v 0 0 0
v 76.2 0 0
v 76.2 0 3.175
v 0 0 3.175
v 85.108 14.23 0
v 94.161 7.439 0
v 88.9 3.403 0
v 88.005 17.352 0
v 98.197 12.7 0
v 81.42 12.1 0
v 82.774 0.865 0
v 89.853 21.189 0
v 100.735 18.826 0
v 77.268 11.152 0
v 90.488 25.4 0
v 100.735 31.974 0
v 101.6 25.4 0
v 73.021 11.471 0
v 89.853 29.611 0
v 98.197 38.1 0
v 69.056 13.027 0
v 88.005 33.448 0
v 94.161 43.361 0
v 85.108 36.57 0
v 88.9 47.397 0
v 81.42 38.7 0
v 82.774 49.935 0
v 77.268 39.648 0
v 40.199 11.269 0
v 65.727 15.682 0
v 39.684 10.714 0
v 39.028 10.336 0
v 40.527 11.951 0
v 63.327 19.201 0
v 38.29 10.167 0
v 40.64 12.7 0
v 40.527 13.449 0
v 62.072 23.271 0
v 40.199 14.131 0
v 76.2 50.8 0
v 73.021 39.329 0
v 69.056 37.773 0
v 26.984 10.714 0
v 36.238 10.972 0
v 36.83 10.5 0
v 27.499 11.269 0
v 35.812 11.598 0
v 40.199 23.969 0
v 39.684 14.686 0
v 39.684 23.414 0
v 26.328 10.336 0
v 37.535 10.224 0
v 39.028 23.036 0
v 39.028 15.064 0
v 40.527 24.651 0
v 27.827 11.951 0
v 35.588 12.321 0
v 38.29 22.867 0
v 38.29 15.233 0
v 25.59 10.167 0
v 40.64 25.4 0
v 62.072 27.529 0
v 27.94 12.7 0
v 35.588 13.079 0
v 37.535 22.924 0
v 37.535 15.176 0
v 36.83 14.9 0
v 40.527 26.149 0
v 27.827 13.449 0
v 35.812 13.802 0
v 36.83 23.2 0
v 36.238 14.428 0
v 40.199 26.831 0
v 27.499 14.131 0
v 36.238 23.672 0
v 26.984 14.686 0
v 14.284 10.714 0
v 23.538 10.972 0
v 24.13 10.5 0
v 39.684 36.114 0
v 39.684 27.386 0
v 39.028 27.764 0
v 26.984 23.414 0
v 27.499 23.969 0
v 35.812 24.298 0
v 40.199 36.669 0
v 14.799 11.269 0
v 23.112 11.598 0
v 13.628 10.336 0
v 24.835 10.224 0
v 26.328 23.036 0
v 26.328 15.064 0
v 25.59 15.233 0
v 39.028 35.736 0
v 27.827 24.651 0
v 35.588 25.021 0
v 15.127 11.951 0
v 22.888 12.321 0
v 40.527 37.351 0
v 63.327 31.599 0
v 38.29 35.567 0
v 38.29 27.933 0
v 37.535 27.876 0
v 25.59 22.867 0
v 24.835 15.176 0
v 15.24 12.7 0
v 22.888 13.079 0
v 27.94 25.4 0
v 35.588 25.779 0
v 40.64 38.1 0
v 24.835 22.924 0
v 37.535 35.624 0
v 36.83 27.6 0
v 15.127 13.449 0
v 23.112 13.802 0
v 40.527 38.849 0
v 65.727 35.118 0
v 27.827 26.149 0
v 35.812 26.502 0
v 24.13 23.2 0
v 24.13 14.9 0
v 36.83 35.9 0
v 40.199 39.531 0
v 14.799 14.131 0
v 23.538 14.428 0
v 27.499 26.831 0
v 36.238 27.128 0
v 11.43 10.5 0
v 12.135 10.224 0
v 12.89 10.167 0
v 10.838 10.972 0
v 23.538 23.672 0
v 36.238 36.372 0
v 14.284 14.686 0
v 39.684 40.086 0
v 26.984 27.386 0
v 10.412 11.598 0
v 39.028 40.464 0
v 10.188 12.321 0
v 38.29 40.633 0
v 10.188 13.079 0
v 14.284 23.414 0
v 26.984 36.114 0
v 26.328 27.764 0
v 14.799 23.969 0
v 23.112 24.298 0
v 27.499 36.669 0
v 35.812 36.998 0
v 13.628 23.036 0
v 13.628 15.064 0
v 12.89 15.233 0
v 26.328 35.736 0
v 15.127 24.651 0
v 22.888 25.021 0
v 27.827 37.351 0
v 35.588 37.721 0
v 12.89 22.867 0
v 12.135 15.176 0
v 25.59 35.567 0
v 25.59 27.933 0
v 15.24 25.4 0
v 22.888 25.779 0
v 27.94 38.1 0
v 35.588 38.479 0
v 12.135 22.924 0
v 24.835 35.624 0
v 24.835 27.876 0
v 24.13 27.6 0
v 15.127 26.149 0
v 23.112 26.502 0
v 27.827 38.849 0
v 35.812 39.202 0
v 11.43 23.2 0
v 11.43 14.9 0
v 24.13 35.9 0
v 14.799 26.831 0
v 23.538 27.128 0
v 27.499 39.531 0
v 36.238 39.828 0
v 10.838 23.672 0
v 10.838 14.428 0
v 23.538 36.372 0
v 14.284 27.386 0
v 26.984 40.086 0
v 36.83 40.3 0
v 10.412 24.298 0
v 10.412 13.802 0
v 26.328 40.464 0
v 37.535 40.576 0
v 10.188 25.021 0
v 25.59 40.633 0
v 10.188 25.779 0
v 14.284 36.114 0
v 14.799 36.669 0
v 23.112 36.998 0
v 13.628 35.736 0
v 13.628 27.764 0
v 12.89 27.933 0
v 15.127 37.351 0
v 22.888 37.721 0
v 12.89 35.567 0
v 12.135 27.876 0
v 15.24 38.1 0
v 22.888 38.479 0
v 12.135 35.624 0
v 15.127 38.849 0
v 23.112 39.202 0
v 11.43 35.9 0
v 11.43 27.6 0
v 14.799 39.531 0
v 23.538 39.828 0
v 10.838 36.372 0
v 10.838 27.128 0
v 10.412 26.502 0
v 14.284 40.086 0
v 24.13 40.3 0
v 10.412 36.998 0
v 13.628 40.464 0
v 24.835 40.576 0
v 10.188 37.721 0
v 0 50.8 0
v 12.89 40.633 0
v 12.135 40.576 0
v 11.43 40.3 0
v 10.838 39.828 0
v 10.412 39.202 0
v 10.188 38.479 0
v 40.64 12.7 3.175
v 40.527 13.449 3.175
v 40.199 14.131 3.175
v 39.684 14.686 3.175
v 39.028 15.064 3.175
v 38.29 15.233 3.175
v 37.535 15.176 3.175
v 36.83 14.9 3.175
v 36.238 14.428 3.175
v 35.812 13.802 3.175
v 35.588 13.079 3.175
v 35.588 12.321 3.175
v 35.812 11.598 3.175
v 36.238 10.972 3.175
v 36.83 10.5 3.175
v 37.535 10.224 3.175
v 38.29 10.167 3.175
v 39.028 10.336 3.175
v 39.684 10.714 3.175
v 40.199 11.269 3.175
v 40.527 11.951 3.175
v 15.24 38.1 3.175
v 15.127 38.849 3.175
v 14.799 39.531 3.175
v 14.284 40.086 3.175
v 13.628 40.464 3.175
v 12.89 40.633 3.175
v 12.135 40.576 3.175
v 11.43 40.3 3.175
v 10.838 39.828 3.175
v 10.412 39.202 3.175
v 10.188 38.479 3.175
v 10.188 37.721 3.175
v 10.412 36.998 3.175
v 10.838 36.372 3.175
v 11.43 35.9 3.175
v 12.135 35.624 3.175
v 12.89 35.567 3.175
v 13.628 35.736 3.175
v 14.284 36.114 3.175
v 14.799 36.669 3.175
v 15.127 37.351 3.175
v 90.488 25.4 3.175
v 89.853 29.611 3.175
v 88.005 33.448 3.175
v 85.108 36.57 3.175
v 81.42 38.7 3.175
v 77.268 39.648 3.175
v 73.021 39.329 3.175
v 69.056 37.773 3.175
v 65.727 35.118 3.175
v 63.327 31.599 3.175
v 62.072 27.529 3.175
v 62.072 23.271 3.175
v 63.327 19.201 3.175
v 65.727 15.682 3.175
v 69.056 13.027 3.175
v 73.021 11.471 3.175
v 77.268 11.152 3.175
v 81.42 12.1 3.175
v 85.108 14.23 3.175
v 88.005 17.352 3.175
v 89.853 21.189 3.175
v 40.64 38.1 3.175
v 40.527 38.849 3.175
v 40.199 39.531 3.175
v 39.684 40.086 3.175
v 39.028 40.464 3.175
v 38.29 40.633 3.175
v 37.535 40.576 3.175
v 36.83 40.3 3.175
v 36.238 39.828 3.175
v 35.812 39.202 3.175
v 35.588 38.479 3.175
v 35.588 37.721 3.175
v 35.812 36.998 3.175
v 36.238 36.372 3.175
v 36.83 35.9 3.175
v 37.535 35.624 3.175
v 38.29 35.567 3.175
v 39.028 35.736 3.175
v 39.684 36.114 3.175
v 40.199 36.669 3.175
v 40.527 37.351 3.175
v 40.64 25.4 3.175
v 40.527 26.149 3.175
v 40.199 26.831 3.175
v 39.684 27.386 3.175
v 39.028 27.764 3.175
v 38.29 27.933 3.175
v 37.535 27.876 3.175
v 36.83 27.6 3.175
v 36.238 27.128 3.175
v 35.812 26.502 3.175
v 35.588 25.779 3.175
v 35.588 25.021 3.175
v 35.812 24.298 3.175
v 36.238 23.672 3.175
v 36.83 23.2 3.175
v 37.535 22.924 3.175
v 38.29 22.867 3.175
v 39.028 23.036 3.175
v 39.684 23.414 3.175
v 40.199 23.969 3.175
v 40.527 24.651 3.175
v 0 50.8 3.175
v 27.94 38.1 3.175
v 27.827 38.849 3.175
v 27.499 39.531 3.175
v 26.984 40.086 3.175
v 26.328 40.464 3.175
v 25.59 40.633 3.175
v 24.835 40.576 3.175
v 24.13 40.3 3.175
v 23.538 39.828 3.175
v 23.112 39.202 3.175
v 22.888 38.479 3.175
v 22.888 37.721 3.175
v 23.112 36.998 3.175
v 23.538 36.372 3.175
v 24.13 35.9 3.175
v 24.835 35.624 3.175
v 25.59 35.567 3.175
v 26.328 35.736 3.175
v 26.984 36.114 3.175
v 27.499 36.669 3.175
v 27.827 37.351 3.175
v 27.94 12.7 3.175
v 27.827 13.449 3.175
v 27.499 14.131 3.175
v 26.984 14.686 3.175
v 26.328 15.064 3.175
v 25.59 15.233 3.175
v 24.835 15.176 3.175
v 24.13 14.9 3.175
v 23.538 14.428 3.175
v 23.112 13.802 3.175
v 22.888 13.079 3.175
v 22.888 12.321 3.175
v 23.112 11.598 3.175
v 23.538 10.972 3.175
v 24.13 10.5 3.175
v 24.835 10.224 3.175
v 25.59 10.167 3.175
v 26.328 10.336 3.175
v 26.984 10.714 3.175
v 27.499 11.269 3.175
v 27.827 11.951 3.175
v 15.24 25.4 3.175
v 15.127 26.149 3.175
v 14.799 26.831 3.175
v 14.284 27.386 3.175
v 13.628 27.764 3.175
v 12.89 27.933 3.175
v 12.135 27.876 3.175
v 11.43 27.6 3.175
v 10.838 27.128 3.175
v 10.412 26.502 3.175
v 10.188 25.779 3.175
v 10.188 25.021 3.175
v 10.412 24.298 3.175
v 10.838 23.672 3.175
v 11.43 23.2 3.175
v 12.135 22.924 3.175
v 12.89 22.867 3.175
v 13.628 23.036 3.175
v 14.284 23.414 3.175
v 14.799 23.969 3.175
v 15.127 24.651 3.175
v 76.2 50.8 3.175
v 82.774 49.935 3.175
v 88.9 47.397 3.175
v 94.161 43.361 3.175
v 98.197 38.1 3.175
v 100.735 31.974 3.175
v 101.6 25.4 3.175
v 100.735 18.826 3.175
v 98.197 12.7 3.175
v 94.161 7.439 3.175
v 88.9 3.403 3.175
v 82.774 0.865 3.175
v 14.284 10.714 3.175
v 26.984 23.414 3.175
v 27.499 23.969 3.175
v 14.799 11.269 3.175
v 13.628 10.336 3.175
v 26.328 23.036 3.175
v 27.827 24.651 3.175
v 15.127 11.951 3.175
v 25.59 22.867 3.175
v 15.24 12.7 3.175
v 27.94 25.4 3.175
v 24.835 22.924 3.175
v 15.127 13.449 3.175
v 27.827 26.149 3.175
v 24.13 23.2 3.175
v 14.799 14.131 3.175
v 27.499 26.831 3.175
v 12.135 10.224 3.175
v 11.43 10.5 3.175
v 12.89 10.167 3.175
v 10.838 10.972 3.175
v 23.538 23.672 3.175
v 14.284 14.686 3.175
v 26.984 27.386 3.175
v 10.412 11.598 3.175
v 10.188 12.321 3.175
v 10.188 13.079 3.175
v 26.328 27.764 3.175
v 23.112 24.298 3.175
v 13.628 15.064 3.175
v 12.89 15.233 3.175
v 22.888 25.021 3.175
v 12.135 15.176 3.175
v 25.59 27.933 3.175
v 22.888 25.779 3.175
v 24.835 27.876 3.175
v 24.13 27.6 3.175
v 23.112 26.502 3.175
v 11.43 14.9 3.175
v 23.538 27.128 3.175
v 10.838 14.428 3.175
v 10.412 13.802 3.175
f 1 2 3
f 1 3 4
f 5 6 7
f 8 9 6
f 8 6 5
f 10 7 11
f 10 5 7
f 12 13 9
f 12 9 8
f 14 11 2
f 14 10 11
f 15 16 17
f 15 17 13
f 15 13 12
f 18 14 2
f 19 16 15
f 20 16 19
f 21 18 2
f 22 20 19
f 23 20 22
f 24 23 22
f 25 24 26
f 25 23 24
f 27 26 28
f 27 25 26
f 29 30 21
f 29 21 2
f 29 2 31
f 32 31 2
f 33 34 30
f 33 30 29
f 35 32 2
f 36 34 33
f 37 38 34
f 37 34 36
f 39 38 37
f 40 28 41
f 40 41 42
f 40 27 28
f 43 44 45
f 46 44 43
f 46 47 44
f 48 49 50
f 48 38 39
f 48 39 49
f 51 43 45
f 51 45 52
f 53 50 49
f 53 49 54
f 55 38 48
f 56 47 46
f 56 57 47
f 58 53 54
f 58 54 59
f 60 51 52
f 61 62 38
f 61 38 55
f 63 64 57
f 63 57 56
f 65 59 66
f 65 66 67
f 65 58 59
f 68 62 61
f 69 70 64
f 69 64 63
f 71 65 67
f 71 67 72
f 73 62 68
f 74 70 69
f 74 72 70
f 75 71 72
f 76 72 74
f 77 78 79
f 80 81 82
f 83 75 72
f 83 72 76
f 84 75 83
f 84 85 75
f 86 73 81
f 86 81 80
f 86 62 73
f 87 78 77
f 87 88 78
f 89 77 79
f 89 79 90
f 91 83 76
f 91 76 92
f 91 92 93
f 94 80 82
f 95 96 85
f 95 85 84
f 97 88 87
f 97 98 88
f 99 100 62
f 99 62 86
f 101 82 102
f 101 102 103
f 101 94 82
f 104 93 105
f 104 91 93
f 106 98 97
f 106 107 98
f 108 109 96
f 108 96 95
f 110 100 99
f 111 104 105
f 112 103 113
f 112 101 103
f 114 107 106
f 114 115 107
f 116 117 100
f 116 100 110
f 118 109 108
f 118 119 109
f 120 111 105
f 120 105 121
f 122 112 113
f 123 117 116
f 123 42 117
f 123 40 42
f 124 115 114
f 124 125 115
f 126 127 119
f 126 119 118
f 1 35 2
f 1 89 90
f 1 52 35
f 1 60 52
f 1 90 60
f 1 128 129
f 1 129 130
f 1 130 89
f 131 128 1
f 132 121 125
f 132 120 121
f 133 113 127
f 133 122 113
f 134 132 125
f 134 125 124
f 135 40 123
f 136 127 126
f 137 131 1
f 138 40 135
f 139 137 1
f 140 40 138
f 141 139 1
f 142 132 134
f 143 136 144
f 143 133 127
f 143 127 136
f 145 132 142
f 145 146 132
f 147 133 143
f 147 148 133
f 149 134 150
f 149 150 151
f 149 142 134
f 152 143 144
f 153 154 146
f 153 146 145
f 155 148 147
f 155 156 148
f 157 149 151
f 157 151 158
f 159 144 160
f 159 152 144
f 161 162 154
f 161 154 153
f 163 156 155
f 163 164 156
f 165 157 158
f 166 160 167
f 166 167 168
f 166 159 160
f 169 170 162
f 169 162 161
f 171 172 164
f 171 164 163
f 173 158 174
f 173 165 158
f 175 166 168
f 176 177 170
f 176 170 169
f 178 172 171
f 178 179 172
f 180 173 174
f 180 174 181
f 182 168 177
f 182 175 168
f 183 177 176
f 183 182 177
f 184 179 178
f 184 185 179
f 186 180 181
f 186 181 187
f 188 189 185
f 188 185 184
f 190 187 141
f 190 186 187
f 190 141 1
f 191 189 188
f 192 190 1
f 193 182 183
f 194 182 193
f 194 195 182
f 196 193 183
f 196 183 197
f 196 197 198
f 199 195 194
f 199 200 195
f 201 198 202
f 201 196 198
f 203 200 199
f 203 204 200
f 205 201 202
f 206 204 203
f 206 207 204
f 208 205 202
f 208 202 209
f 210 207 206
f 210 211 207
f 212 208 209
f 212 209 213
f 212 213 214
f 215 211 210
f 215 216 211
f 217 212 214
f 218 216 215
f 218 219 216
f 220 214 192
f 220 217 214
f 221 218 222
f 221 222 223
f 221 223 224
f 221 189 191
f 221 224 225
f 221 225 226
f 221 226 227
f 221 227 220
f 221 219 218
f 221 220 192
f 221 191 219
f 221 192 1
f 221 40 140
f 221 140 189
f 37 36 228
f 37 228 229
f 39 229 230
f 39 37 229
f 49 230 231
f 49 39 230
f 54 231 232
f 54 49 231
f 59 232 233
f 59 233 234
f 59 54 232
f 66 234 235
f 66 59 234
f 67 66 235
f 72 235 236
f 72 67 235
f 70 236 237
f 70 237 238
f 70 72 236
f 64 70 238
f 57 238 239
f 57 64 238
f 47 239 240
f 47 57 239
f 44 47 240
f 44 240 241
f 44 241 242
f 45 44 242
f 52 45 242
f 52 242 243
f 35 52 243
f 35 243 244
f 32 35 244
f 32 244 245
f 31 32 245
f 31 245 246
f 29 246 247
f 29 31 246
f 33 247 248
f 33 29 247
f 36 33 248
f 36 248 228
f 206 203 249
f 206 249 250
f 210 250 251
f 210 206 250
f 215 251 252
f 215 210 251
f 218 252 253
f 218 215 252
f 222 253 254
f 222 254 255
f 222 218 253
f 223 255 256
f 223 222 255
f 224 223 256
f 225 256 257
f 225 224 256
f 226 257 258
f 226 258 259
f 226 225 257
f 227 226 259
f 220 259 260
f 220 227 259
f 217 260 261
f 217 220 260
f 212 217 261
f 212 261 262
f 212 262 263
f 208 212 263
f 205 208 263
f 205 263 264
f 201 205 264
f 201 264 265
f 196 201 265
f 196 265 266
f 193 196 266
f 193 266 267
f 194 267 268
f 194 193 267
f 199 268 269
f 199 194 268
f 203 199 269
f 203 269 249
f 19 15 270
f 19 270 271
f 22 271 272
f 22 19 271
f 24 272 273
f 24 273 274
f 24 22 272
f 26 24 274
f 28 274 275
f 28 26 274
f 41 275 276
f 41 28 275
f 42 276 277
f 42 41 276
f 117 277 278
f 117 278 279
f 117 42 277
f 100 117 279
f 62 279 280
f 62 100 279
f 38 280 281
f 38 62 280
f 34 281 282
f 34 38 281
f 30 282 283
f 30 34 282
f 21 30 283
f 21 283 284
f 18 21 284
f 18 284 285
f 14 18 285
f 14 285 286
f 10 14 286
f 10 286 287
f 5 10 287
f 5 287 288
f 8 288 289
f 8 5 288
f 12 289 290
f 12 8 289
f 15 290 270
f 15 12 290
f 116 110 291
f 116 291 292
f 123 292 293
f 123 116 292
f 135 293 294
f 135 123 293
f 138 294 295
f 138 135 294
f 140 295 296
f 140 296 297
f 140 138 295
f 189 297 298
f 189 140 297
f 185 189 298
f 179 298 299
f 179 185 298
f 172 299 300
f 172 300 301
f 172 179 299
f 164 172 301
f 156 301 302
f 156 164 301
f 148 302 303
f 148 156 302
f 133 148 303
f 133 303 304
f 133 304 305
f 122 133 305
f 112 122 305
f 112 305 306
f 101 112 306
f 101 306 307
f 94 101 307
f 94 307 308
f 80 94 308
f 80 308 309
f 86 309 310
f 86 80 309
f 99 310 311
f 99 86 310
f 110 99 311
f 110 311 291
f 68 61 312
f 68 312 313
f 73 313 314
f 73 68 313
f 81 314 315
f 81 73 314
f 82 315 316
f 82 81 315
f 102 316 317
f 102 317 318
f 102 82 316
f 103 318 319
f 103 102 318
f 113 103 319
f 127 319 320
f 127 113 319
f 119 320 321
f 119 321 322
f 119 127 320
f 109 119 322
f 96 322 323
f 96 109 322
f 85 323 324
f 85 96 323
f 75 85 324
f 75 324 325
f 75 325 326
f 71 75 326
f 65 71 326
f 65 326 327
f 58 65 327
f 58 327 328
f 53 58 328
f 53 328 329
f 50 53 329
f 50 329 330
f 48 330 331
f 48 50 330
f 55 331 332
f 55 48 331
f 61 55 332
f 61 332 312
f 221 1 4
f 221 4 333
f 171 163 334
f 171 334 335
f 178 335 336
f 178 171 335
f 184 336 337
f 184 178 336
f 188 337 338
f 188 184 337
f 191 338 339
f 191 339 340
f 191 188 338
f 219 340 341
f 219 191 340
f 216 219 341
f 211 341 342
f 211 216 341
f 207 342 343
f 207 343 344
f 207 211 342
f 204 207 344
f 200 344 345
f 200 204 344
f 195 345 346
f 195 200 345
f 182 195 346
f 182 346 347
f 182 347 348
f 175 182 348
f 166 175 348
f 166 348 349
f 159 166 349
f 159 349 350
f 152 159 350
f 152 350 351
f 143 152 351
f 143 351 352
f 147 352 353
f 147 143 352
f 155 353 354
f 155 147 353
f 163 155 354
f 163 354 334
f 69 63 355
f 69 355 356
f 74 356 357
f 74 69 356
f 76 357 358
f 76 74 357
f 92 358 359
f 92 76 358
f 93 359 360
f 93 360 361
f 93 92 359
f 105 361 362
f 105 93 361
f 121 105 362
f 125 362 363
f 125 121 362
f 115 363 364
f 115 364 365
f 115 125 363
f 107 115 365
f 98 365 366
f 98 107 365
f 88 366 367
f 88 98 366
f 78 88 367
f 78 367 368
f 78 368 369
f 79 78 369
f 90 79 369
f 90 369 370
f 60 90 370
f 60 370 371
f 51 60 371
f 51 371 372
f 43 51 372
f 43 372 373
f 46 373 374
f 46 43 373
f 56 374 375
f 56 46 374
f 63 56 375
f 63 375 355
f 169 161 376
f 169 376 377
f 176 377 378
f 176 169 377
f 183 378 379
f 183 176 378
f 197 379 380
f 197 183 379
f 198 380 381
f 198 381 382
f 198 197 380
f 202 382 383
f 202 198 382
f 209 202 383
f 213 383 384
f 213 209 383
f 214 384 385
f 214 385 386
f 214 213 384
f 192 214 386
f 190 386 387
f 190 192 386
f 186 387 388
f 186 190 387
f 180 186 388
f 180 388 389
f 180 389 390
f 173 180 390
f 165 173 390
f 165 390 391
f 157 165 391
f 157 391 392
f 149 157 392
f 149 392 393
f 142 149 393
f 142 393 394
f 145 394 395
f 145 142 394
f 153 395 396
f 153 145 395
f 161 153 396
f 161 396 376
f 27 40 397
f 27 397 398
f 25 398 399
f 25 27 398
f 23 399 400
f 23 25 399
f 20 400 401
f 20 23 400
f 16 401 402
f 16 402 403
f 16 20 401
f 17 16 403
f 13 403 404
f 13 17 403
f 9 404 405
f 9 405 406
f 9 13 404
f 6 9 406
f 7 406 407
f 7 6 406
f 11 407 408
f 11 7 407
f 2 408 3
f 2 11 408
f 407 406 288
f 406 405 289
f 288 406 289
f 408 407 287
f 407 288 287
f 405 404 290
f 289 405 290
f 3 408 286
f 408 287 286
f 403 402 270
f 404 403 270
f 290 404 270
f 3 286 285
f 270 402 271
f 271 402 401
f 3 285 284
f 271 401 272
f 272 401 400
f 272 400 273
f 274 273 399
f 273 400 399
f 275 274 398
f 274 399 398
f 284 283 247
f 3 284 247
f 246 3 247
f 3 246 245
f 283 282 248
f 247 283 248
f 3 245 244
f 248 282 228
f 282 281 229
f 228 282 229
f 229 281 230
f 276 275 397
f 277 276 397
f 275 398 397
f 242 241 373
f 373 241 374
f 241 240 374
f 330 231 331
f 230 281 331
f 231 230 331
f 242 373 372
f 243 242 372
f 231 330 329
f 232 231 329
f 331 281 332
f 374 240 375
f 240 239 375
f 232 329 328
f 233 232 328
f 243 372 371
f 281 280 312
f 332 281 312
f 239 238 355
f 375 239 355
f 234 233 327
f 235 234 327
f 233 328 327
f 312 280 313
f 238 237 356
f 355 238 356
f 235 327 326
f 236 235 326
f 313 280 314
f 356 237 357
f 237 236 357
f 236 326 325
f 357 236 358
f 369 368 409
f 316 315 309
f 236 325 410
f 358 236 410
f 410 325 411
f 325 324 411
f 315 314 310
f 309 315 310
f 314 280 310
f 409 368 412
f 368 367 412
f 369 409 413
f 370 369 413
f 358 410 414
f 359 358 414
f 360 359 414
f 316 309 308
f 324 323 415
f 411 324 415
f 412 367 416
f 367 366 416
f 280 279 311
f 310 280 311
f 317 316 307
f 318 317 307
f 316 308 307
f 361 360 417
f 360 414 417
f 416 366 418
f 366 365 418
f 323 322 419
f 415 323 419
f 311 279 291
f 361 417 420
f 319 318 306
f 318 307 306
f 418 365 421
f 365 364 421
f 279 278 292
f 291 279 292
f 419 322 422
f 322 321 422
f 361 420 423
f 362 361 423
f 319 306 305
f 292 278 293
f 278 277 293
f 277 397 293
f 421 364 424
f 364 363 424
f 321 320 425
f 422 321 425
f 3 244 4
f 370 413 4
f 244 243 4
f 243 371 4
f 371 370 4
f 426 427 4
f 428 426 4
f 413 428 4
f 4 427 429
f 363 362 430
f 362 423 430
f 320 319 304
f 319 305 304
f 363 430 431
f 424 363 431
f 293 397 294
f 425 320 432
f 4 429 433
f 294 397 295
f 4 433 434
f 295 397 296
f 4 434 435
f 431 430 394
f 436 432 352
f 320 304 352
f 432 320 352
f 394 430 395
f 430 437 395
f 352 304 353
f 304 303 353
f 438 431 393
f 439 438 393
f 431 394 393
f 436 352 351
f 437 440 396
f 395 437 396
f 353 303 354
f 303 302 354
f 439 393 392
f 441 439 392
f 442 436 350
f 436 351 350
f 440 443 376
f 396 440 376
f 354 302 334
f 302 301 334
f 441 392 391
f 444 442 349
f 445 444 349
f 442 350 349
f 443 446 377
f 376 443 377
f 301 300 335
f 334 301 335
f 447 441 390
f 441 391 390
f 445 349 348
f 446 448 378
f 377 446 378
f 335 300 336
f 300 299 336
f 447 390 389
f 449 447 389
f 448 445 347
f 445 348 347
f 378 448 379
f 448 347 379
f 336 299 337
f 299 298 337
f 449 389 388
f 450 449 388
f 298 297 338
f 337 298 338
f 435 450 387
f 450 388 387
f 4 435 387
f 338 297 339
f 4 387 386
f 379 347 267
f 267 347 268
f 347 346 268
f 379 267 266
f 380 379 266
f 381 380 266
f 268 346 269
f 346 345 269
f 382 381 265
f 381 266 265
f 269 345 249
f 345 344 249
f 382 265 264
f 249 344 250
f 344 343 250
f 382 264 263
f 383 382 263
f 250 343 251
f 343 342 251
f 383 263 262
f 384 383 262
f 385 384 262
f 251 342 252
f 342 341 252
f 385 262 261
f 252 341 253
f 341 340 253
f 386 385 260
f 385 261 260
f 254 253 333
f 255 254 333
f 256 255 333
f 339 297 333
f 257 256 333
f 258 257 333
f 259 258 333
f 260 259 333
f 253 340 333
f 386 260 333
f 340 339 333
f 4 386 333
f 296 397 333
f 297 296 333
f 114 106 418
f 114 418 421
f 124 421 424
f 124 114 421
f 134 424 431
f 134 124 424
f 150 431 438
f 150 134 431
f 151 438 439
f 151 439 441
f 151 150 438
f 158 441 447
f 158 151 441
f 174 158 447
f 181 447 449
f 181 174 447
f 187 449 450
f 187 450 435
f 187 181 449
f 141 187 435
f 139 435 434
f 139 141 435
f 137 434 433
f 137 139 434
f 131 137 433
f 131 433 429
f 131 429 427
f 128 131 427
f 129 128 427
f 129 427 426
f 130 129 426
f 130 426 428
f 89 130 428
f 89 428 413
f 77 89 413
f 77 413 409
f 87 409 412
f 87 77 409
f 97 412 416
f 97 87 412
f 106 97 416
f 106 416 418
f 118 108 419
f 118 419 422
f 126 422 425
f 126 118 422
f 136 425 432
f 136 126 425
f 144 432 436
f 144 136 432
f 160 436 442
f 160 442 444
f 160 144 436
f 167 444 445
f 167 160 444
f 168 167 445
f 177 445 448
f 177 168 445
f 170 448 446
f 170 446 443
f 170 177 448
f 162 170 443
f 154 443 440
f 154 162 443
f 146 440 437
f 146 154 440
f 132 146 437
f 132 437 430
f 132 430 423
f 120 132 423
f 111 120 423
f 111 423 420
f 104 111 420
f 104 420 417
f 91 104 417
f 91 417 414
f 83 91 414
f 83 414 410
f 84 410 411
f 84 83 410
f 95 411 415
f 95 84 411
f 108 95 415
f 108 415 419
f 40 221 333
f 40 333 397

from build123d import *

# Parameters (mm, degrees)
SKETCH1_R           = 2.54
SKETCH1_R_2         = 14.2875
BOSS_EXTRUDE1_DEPTH = 3.175


with BuildPart() as part:
    # Sketch1 → Boss-Extrude1 (new body)
    with BuildSketch(Plane.XY):
        with BuildLine():
            Line((0, 0), (0, 50.8))
            Line((0, 50.8), (76.2, 50.8))
            ThreePointArc((76.2, 50.8), (101.6, 25.4), (76.2, 0))
            Line((76.2, 0), (0, 0))
        make_face()
        with Locations((12.7, 38.1)):
            Circle(SKETCH1_R, mode=Mode.SUBTRACT)
        with Locations((25.4, 38.1)):
            Circle(SKETCH1_R, mode=Mode.SUBTRACT)
        with Locations((38.1, 38.1)):
            Circle(SKETCH1_R, mode=Mode.SUBTRACT)
        with Locations((25.4, 25.4)):
            Circle(SKETCH1_R, mode=Mode.SUBTRACT)
        with Locations((38.1, 25.4)):
            Circle(SKETCH1_R, mode=Mode.SUBTRACT)
        with Locations((25.4, 12.7)):
            Circle(SKETCH1_R, mode=Mode.SUBTRACT)
        with Locations((38.1, 12.7)):
            Circle(SKETCH1_R, mode=Mode.SUBTRACT)
        with Locations((12.7, 25.4)):
            Circle(SKETCH1_R, mode=Mode.SUBTRACT)
        with Locations((12.7, 12.7)):
            Circle(SKETCH1_R, mode=Mode.SUBTRACT)
        with Locations((76.2, 25.4)):
            Circle(SKETCH1_R_2, mode=Mode.SUBTRACT)
    extrude(amount=BOSS_EXTRUDE1_DEPTH)


solid = part.part
